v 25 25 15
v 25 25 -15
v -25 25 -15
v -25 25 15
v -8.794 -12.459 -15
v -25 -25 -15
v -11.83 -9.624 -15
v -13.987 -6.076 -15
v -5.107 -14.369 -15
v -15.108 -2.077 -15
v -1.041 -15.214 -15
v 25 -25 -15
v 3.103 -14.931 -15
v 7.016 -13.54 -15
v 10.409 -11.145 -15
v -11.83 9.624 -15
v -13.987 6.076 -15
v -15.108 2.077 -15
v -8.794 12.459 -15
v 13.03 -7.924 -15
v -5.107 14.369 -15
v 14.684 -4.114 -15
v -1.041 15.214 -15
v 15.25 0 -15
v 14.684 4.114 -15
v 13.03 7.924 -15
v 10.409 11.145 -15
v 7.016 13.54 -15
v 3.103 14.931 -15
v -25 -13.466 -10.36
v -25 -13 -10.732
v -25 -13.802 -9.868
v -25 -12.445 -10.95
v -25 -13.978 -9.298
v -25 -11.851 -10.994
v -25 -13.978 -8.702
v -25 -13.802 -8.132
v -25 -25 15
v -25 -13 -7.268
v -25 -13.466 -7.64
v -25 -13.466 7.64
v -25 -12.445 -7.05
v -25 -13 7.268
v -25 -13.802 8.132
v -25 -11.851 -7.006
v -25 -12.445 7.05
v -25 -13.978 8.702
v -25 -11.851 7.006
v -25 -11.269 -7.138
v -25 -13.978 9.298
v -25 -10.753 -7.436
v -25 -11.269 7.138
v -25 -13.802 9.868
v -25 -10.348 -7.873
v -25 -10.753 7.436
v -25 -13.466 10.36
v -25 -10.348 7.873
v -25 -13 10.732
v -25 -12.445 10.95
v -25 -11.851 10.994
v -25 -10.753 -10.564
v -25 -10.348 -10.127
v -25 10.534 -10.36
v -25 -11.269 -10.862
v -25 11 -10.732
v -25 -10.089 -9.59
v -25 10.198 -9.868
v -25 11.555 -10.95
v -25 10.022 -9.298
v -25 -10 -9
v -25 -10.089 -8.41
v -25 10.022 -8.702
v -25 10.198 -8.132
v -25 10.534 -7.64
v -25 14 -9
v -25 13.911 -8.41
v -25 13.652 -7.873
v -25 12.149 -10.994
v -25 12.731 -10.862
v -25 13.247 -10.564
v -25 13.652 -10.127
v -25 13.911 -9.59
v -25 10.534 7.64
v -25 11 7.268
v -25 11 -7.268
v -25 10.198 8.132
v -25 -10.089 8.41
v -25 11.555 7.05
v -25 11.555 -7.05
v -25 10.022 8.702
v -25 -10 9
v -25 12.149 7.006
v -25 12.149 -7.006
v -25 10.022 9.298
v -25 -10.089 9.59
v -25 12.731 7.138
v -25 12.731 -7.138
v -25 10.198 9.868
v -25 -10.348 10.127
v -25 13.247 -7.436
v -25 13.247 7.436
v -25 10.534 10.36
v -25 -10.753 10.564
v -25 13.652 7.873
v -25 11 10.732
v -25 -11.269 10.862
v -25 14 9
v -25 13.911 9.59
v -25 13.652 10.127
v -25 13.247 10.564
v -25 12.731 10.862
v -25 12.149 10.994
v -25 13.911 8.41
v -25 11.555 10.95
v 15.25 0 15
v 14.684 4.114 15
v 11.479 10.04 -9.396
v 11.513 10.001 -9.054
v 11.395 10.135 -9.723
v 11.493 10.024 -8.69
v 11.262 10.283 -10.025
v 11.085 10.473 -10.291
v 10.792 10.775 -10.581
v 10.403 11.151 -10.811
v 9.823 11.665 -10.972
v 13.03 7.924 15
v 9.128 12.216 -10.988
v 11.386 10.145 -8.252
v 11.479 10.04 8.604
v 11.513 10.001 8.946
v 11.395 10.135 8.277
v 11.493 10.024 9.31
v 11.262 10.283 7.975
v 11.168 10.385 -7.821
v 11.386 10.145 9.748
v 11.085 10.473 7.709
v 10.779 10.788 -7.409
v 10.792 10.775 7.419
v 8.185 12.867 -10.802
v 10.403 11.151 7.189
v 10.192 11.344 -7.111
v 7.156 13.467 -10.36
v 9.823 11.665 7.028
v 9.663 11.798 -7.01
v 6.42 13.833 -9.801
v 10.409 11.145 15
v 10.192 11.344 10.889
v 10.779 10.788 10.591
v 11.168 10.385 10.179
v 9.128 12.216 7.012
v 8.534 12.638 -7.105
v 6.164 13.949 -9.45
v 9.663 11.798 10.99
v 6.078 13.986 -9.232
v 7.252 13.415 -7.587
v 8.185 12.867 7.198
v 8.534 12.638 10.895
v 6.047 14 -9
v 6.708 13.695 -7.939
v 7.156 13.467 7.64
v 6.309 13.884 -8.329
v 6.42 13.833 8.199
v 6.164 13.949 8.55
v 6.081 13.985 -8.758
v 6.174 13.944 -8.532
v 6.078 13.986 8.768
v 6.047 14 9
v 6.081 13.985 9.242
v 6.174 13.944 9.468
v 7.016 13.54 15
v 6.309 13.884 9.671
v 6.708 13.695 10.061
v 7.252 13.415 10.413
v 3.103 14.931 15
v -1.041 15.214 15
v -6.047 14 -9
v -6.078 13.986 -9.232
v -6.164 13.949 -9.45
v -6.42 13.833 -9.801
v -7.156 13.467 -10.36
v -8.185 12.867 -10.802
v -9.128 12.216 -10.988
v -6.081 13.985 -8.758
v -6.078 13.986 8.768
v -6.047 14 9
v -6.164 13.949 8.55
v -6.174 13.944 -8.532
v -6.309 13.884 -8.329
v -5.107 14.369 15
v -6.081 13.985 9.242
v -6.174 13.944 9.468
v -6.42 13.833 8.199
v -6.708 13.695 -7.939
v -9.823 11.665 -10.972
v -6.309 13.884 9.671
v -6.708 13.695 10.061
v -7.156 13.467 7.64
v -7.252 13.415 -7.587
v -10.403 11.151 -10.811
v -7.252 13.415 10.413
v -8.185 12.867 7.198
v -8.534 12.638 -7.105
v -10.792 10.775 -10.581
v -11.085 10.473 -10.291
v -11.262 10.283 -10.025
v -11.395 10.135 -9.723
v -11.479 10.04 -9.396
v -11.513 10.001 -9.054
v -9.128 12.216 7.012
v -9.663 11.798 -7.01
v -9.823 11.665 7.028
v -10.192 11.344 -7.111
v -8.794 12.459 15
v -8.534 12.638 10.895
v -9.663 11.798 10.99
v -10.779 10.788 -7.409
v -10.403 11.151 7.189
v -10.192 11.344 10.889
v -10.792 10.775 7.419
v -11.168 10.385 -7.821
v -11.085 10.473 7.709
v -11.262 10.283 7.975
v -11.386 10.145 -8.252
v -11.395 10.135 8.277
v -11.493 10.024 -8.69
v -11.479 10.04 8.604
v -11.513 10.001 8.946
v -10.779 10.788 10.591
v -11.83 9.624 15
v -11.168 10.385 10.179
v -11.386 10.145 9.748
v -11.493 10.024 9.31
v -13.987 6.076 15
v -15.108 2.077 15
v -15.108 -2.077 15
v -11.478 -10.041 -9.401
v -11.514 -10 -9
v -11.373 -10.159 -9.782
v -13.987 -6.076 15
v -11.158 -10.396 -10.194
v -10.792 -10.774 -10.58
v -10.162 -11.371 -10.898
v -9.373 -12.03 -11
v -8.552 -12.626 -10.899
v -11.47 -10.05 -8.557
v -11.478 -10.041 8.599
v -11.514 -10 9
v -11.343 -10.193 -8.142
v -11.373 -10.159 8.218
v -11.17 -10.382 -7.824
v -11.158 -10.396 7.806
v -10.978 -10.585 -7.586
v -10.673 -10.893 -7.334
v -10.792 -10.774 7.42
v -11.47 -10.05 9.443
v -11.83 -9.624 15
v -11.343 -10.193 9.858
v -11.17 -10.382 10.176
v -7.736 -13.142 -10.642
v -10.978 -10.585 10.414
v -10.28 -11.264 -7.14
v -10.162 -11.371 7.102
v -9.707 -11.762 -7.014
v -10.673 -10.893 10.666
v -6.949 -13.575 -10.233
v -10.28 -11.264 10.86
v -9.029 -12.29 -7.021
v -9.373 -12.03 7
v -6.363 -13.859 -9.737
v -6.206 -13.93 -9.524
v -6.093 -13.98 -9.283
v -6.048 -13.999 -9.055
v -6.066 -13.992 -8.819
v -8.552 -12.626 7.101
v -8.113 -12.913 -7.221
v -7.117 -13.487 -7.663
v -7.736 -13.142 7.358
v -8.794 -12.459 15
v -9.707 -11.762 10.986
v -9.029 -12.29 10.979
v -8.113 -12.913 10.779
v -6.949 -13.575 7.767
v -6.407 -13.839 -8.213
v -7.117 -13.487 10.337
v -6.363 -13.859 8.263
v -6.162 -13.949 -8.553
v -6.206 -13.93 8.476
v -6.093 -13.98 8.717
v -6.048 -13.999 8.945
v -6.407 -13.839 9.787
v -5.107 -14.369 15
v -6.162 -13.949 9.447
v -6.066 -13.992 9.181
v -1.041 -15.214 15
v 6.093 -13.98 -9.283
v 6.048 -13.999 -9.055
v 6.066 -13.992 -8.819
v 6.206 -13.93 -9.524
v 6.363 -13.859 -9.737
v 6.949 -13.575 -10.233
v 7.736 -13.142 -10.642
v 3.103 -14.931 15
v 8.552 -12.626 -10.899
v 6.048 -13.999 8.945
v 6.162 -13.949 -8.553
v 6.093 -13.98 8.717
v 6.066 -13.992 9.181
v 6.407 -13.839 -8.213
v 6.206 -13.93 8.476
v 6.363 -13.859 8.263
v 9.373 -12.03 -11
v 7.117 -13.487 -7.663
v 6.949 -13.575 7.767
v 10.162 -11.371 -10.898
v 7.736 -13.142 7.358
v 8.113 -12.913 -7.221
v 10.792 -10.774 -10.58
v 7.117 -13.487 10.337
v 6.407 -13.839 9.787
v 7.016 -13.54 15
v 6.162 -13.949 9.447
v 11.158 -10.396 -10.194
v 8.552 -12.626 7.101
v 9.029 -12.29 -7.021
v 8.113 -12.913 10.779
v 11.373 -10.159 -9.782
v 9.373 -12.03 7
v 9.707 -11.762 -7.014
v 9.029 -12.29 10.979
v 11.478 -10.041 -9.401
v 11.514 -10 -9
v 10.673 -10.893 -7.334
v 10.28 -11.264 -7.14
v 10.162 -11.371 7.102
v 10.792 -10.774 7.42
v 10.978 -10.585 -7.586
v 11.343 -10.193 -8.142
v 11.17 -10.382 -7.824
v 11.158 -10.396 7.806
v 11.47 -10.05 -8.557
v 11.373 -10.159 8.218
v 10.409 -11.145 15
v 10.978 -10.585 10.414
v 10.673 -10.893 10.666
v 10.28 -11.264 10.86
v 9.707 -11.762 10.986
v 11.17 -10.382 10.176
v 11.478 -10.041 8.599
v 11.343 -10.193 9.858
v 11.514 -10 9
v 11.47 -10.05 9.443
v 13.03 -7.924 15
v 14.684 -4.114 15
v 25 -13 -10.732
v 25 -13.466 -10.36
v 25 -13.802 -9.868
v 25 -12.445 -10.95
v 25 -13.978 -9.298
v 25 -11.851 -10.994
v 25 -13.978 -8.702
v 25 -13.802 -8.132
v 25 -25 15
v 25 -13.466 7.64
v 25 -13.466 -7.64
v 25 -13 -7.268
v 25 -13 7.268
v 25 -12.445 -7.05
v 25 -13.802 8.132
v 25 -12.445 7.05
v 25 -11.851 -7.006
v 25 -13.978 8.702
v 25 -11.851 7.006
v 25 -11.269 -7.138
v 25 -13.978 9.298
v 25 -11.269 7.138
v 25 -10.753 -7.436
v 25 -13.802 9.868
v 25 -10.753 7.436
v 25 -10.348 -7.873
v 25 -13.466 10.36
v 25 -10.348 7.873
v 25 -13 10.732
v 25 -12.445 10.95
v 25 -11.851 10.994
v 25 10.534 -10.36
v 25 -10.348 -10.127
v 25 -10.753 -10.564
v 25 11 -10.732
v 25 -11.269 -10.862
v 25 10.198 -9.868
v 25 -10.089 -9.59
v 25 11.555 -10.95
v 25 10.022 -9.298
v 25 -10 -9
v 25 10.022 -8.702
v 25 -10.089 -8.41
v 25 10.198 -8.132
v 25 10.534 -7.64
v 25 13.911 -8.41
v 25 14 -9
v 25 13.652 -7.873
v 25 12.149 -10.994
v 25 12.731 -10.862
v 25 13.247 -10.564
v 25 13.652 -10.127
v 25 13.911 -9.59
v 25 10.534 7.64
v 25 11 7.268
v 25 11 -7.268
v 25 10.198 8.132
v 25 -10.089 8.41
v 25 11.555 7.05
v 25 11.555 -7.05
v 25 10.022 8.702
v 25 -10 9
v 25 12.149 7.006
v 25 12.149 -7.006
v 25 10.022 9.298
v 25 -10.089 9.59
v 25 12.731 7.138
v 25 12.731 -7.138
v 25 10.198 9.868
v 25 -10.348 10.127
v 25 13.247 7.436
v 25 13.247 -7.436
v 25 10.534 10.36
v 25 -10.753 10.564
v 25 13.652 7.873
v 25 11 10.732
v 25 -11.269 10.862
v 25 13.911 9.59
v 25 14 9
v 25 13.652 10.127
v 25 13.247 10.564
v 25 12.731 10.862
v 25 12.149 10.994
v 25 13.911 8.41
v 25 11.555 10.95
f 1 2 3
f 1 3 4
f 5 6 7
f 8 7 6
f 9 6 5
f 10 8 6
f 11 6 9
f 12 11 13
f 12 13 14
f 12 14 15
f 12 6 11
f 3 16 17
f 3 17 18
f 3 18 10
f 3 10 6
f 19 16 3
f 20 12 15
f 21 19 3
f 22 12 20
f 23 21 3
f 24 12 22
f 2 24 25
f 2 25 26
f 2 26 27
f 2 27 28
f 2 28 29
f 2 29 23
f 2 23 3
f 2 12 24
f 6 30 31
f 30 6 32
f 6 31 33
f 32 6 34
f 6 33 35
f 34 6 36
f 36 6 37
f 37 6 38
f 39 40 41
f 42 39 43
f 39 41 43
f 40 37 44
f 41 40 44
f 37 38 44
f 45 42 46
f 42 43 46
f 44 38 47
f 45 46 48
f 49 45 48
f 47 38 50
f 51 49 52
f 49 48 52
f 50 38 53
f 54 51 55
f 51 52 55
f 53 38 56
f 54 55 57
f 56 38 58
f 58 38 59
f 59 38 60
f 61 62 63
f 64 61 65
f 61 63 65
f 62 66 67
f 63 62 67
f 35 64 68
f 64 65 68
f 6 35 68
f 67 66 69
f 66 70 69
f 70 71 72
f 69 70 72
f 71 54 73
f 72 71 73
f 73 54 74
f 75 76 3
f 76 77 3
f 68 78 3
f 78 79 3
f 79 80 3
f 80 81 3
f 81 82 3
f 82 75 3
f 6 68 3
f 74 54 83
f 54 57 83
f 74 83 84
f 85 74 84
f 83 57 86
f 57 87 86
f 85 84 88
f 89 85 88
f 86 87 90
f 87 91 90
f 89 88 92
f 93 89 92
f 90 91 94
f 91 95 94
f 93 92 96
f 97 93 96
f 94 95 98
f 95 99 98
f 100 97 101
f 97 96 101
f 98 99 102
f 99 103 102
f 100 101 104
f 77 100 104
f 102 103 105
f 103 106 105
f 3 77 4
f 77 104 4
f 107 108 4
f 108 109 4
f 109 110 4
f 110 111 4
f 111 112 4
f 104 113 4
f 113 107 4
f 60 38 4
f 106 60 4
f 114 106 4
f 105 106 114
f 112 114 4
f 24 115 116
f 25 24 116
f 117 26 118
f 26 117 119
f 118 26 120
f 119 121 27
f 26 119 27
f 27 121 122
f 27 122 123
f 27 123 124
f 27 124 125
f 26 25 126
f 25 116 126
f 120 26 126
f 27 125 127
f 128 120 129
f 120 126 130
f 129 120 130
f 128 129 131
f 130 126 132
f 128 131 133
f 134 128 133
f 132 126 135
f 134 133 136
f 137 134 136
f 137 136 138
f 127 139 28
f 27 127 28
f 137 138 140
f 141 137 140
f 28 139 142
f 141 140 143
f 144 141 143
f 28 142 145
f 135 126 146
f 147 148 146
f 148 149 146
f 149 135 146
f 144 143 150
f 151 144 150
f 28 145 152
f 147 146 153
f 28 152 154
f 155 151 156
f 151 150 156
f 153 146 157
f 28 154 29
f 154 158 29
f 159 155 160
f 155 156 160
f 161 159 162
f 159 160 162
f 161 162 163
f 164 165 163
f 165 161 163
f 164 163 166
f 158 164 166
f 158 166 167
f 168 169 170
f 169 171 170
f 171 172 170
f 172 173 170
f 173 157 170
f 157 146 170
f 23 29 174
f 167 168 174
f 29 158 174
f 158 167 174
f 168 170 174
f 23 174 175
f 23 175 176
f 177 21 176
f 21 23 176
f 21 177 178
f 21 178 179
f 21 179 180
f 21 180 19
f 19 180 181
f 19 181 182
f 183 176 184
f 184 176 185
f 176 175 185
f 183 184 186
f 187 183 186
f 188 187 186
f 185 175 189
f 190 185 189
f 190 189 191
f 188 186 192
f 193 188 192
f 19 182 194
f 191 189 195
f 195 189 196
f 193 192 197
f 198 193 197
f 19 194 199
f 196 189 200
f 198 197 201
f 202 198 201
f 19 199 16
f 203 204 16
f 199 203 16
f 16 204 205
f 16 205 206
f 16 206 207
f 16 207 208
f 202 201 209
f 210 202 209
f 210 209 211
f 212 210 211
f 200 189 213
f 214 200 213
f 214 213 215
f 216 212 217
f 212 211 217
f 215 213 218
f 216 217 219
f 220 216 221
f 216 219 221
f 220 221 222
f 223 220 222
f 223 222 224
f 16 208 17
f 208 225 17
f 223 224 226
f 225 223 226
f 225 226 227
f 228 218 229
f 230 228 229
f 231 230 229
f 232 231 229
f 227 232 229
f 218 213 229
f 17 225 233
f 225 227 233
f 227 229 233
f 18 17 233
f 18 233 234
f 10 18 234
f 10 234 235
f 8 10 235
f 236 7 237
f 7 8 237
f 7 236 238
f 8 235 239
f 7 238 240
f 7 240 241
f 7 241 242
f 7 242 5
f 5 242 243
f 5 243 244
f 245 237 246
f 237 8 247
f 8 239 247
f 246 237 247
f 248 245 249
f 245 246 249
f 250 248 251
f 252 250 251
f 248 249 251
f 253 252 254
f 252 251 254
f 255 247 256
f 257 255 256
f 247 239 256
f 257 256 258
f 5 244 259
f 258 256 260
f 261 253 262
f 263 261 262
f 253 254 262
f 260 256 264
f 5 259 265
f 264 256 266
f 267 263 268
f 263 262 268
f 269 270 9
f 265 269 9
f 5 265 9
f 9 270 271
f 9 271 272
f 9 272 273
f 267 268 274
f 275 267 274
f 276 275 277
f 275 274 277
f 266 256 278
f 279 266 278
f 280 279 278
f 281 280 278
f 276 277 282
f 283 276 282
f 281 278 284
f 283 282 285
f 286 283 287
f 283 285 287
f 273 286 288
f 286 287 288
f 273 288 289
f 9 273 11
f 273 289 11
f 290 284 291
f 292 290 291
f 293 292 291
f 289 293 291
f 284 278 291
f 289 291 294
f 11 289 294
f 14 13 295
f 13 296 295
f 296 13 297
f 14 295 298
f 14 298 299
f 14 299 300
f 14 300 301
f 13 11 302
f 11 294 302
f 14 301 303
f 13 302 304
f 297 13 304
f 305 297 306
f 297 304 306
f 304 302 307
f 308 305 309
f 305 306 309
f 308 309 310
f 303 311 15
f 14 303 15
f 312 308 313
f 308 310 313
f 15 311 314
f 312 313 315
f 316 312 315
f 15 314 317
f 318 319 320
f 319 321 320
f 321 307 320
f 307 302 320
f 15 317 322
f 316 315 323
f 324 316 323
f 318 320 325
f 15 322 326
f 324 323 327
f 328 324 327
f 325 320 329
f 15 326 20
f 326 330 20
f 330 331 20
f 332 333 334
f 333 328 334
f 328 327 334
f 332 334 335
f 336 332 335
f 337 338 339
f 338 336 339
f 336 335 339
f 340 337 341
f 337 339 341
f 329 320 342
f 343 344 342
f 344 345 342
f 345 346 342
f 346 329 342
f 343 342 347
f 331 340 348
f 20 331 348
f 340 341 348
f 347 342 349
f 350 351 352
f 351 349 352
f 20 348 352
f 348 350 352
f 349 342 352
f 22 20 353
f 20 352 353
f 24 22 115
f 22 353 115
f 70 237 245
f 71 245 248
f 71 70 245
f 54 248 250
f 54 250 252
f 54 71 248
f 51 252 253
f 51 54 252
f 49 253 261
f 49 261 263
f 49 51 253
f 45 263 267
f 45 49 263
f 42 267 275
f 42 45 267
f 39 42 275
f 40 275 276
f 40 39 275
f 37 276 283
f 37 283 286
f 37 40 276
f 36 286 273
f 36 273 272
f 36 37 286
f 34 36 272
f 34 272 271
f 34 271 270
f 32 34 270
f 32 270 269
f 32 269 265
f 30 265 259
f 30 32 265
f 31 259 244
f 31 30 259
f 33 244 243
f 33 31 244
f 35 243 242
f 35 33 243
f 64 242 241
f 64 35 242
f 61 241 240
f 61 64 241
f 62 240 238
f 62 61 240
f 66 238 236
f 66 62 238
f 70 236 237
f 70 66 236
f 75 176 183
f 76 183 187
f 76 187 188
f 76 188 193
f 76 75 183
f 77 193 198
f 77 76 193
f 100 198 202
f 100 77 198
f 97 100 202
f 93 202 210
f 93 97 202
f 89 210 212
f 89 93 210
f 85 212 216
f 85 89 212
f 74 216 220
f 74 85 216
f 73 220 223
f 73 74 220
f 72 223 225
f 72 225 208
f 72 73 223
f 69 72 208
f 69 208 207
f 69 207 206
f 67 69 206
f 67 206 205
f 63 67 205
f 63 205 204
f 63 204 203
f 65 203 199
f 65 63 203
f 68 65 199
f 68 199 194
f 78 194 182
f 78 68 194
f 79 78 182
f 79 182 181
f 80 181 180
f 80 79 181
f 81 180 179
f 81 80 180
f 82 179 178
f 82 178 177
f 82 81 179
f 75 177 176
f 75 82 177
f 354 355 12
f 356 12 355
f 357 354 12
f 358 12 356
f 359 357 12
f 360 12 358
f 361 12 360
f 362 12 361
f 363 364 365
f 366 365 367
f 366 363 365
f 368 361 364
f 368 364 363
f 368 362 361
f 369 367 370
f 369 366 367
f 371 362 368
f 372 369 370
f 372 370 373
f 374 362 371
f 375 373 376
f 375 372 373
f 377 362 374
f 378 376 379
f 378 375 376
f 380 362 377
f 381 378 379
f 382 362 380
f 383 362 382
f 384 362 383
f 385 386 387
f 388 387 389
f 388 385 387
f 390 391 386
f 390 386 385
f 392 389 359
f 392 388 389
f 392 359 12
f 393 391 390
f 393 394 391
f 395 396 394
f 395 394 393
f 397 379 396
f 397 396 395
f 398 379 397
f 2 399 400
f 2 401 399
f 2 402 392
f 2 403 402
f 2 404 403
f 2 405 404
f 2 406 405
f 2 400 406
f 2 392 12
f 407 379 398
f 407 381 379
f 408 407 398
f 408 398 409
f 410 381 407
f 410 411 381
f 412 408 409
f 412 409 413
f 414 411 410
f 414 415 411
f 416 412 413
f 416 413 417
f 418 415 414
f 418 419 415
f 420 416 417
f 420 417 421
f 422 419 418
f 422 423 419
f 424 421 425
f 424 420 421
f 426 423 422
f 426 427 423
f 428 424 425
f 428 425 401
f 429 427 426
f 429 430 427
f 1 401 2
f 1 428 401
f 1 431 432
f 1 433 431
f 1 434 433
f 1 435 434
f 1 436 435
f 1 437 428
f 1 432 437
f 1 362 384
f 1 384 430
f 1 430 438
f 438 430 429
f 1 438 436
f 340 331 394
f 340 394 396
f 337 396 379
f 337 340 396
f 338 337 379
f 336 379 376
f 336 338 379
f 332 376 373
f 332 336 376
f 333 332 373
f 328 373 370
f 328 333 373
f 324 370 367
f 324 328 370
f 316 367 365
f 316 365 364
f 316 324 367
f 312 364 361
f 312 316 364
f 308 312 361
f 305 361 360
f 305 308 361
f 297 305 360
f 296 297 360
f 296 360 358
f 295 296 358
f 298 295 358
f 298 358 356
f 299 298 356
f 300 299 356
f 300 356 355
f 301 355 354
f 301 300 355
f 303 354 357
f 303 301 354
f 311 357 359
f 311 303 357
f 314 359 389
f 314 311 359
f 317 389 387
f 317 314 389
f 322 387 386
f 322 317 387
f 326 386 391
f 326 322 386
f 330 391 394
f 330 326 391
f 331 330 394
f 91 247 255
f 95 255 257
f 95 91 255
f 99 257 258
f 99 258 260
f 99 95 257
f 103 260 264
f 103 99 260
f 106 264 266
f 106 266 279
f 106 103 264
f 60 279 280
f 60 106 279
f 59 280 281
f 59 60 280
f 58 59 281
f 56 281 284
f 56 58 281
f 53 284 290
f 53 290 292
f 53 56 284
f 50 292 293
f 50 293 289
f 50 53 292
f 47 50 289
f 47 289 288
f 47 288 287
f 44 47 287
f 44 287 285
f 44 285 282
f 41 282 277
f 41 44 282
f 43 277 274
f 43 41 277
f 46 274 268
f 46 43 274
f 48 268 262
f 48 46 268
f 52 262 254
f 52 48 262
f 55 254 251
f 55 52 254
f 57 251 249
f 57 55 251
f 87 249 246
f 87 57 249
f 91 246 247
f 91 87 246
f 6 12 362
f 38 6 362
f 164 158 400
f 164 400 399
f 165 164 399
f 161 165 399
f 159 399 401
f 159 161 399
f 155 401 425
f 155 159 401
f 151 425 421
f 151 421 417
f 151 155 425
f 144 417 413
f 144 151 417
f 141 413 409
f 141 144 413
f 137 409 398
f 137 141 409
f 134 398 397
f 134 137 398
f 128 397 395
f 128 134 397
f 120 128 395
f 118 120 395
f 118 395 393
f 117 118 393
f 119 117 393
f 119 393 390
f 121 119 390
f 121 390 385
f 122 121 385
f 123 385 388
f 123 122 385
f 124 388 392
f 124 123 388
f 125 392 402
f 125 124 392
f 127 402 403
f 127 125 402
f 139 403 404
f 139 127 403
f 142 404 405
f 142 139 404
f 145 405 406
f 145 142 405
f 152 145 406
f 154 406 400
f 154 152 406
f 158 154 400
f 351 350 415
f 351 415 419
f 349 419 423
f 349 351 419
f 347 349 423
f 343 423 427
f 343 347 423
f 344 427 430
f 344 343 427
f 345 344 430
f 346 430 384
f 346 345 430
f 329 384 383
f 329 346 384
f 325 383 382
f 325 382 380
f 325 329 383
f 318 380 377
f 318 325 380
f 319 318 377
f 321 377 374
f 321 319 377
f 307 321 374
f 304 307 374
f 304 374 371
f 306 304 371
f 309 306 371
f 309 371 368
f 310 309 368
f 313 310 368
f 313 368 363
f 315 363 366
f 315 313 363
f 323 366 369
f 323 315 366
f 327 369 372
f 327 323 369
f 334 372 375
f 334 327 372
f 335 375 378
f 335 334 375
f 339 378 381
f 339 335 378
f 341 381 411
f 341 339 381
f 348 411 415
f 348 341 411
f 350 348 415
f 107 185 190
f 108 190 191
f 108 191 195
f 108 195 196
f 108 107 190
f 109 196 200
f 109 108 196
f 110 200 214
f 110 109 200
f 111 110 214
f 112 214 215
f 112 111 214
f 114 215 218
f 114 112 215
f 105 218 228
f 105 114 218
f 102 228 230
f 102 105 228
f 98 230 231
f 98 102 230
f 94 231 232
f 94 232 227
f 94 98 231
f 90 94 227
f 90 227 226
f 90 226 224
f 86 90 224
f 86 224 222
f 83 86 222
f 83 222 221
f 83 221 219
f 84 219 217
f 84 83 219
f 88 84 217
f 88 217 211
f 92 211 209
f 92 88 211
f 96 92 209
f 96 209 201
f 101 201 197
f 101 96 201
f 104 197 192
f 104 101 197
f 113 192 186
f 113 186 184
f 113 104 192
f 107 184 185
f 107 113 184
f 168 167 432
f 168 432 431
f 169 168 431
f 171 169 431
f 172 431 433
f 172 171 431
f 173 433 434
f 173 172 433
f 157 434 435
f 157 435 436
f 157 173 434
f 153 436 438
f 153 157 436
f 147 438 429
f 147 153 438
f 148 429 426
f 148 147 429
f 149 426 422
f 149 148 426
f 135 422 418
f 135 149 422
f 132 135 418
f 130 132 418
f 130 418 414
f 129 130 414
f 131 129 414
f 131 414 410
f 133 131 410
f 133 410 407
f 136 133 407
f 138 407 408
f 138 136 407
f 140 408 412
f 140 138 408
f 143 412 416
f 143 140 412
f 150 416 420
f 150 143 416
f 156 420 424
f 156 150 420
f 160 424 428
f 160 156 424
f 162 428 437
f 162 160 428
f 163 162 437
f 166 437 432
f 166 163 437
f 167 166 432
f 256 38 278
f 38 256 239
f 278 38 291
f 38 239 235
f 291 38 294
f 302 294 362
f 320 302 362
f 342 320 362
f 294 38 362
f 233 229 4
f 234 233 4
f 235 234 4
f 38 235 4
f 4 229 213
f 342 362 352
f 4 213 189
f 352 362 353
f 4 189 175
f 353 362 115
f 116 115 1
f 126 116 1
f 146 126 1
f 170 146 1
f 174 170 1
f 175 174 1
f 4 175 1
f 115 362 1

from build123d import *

# Parameters (mm, degrees)
F0_W     = 50
F0_H     = 30
F0_R     = 2
F1_DEPTH = 25
F2_R     = 15.25
F3_DEPTH = 30.001


# Not quite as in the source:
# - a feature names something its author has since deleted; it is built from what else it names


with BuildPart() as f1:
    # F0 (on Right) → F1 (new body, symmetric)
    with BuildSketch(Plane.YZ):
        Rectangle(F0_W, F0_H)
        with Locations((-12.0000001043, -9)):
            Circle(F0_R, mode=Mode.SUBTRACT)
        with Locations((12.0000001043, -9)):
            Circle(F0_R, mode=Mode.SUBTRACT)
        with Locations((-12, 9)):
            Circle(F0_R, mode=Mode.SUBTRACT)
        with Locations((12, 9)):
            Circle(F0_R, mode=Mode.SUBTRACT)
    extrude(amount=F1_DEPTH, both=True)

    # F2 (on face) → F3 (cut, through all)
    with BuildSketch(Plane.XY.offset(15)):
        Circle(F2_R)
    extrude(amount=-F3_DEPTH, mode=Mode.SUBTRACT)


solid = f1.part
